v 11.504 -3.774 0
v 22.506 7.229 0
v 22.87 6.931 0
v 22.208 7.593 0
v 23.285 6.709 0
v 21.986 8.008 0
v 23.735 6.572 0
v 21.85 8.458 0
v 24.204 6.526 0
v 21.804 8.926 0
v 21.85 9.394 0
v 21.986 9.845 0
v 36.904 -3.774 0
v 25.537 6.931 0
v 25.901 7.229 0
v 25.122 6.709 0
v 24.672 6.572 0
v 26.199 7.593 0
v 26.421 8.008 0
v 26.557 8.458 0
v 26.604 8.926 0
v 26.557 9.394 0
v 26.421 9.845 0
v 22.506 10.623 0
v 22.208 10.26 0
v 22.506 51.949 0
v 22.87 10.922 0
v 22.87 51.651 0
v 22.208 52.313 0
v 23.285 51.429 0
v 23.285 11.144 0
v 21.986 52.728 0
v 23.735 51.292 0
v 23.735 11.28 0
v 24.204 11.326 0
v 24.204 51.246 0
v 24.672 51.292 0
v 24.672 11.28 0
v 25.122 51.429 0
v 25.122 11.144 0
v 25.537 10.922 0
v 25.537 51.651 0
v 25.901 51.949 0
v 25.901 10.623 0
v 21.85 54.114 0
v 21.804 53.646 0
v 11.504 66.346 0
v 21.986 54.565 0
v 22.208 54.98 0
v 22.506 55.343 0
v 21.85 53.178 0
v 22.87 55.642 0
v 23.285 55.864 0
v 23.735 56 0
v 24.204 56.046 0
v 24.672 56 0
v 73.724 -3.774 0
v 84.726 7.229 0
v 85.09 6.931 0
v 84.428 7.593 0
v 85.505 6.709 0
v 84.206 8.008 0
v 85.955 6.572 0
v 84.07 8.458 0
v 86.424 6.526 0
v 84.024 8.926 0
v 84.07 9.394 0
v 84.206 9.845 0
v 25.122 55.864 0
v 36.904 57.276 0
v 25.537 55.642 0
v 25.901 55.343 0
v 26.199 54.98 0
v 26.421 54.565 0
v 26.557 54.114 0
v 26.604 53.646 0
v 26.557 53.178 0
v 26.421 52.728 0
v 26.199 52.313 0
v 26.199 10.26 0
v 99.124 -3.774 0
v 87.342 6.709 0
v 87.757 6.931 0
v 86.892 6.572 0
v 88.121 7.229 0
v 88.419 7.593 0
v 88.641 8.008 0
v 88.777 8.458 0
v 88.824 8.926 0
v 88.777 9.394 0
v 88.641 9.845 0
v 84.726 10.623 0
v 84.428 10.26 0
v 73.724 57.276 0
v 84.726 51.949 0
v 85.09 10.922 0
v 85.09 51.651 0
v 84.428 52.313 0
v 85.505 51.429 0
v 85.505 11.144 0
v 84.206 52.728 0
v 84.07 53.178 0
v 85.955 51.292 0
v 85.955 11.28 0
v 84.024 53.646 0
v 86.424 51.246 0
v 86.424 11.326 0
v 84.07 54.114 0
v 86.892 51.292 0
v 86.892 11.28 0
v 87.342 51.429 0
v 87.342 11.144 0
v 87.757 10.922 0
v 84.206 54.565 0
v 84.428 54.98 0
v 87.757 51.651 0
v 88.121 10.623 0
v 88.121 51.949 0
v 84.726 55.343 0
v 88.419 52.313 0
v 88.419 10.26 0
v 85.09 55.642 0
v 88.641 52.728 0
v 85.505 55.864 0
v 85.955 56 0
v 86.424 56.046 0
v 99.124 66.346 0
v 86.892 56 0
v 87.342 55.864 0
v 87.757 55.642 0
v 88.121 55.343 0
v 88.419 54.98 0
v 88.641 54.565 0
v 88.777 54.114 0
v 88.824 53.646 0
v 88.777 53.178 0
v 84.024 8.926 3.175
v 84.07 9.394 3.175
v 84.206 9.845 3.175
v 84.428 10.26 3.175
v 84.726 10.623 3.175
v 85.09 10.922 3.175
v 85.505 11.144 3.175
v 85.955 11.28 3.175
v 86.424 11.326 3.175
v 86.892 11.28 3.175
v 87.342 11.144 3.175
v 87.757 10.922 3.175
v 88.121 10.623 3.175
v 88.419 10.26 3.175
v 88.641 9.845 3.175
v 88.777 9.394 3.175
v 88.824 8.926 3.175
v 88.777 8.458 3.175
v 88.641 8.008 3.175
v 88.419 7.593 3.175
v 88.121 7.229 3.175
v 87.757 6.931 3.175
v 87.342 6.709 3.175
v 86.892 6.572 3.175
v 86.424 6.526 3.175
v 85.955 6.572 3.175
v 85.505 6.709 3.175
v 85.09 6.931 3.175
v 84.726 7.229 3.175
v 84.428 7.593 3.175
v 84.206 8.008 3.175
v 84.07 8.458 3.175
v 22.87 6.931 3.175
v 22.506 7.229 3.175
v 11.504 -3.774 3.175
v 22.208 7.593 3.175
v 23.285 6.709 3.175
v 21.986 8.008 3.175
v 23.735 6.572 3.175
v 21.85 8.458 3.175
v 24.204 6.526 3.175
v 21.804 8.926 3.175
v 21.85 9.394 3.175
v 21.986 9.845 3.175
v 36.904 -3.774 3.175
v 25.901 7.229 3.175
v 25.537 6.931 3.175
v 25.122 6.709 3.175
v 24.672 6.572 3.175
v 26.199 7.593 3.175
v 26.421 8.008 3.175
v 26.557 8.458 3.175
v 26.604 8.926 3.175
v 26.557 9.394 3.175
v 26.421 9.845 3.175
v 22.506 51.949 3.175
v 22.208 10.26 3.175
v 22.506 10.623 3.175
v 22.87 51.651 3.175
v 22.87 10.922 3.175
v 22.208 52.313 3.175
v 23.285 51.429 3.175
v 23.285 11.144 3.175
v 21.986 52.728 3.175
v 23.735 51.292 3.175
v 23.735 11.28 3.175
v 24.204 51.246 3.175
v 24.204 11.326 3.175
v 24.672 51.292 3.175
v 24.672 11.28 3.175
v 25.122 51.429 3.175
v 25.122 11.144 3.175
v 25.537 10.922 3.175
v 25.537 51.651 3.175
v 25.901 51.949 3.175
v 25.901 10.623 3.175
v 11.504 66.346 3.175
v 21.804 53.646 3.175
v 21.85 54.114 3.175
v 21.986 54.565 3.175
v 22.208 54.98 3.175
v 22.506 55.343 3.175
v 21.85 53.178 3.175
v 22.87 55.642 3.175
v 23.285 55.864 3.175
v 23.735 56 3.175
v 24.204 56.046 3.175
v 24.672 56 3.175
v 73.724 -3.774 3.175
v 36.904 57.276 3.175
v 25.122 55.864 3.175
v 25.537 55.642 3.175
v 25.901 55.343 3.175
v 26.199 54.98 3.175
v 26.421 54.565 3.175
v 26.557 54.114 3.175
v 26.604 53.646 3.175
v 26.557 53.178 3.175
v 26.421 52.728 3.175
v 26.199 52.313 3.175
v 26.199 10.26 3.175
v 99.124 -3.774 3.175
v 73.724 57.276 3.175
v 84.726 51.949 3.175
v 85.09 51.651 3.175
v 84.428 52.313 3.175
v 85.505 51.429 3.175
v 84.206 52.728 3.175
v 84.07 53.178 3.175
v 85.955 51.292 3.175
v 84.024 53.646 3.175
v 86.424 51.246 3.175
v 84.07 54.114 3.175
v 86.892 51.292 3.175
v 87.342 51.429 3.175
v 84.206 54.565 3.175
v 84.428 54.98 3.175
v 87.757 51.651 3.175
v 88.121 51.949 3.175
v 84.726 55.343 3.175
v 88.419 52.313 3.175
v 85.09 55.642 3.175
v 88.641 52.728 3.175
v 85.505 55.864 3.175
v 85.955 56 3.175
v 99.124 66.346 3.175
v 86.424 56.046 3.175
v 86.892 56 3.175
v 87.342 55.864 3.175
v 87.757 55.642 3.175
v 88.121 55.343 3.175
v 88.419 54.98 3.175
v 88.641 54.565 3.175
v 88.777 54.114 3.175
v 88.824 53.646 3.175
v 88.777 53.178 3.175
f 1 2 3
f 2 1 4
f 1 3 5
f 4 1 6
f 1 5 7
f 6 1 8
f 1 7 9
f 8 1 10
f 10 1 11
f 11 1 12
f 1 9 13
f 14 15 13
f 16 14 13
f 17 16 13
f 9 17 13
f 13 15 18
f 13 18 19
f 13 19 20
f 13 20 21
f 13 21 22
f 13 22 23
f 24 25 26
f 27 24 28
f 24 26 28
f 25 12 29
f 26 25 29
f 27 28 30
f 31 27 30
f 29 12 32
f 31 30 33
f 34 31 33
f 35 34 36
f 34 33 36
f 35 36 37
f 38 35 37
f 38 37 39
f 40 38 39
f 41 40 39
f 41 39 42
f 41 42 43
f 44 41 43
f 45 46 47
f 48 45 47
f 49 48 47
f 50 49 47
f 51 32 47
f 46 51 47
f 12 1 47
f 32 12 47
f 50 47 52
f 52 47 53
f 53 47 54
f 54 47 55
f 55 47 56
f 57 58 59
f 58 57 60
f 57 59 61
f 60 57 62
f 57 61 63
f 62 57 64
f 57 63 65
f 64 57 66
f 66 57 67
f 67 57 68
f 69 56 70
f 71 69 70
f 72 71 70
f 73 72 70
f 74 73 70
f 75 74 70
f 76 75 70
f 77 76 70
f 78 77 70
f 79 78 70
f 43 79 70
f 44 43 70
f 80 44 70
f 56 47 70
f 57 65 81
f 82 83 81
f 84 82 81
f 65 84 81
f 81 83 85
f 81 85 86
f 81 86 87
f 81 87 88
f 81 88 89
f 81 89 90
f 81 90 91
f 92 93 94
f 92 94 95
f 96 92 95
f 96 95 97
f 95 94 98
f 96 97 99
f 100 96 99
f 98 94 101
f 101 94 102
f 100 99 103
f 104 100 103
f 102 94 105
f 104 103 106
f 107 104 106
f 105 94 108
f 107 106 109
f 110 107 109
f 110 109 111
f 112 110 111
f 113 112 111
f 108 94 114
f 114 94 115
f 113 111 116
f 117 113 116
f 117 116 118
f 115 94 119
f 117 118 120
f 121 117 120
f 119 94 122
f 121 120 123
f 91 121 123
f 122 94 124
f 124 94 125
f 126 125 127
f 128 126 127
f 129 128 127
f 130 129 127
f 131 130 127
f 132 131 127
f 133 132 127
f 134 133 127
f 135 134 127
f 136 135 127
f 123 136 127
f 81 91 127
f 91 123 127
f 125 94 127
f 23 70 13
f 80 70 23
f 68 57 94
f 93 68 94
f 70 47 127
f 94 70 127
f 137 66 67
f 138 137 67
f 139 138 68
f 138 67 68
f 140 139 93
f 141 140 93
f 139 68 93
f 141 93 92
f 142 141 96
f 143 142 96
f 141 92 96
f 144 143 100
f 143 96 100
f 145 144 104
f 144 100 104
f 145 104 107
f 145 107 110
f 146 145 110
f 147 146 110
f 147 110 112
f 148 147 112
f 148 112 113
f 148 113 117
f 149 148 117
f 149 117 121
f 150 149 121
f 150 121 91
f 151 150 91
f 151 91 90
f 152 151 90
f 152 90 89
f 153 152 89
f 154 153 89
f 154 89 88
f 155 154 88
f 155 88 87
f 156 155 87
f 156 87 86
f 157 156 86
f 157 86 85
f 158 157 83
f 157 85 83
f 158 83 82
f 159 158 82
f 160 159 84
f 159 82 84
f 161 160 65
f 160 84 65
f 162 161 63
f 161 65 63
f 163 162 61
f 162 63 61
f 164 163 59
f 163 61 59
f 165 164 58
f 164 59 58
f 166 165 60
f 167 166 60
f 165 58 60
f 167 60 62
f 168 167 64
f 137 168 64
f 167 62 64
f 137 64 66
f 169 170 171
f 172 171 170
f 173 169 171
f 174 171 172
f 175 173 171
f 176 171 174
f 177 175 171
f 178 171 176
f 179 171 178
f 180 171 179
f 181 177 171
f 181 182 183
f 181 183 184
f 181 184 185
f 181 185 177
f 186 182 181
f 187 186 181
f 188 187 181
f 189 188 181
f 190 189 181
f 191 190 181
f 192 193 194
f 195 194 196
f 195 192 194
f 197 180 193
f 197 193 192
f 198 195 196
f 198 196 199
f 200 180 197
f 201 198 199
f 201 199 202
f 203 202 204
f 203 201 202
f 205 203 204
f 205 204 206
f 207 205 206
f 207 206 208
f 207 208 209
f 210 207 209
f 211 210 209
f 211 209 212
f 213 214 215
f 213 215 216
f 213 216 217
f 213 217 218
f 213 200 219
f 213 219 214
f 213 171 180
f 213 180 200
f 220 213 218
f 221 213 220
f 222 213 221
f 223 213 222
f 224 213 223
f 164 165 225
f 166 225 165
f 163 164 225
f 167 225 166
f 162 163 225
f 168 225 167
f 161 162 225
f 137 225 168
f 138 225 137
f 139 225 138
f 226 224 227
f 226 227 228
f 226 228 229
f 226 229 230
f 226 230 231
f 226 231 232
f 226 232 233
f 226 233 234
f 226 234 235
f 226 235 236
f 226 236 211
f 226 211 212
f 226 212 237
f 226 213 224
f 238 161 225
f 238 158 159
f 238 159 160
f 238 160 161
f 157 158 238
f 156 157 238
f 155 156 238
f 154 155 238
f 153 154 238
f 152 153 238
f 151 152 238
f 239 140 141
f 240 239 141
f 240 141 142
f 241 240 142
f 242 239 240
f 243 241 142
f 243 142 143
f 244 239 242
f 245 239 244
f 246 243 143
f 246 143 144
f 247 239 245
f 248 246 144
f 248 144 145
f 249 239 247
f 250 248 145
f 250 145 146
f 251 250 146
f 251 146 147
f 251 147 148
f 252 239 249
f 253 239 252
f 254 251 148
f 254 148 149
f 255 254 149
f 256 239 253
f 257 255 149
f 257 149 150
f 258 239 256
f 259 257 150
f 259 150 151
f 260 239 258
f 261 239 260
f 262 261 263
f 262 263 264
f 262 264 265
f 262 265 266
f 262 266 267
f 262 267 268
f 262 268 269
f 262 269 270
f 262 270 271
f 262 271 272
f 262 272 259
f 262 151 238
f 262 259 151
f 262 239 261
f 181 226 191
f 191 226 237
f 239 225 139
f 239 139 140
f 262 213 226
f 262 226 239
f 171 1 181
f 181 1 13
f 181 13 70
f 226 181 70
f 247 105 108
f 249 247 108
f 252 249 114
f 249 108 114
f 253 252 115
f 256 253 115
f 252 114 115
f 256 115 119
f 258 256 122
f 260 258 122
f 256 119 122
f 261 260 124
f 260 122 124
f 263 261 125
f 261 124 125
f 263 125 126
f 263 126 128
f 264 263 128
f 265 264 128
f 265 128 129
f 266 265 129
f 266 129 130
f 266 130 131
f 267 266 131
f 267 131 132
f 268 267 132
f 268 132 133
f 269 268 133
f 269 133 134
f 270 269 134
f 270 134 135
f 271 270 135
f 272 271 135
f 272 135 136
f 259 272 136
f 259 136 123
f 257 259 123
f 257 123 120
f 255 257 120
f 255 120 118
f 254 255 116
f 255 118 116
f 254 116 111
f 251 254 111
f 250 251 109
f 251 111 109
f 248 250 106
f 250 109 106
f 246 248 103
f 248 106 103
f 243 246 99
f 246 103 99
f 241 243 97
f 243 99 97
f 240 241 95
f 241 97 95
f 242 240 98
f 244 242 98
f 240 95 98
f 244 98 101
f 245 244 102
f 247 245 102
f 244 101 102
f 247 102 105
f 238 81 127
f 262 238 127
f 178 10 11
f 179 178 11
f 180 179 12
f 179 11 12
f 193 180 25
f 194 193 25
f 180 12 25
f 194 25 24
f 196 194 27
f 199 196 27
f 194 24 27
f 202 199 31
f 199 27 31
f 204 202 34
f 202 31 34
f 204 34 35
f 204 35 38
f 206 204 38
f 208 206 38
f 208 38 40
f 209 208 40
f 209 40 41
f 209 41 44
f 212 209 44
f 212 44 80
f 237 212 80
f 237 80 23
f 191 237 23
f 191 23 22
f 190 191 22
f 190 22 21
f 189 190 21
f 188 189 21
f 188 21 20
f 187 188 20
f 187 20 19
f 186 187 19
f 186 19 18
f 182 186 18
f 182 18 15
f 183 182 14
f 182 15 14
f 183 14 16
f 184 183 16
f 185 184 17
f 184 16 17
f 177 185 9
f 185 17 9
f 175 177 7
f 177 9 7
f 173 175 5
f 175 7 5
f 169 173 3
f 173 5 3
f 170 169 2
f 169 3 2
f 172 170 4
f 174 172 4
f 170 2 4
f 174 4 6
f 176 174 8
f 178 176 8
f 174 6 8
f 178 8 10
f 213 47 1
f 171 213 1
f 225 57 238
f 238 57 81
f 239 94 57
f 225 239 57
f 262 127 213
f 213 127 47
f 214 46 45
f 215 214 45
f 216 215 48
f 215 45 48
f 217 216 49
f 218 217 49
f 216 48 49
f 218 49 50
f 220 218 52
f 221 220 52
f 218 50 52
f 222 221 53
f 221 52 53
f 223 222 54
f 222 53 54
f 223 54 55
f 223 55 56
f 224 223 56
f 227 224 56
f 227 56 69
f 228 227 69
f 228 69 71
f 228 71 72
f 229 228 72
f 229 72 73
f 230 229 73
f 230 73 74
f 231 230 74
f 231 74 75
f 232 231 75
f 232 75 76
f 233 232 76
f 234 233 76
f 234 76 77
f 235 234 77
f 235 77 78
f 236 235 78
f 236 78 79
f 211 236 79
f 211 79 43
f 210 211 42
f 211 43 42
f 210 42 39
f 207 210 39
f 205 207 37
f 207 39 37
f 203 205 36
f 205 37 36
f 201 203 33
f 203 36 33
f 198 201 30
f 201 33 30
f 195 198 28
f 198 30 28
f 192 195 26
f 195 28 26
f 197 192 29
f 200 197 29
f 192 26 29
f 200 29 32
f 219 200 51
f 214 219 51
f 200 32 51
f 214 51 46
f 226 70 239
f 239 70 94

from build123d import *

# Parameters (mm, degrees)
SKETCH1_R            = 1.091149581
SKETCH1_R_2          = 1.265238112
SKETCH1_R_3          = 1.717110749
SKETCH1_R_4          = 1.455402606
BOSS_EXTRUDE1_DEPTH  = 3.175
M4_CLEARANCE_HOLE1_D = 4.8


with BuildPart() as part:
    # Sketch1 → Boss-Extrude1 (new body)
    with BuildSketch(Plane.XY):
        Polygon((11.503555024, -3.77372269), (36.903555024, -3.77372269), (36.903555024, 57.275941722), (73.723553593, 57.275941722), (73.723553593, -3.77372269), (99.123553593, -3.77372269), (99.123553593, 66.34627731), (73.723553593, 66.34627731), (36.903555024, 66.34627731), (11.503555024, 66.34627731), align=None)
        with Locations((24.203555024, 53.64627731)):
            Circle(SKETCH1_R, mode=Mode.SUBTRACT)
        with Locations((24.203555024, 8.92627731)):
            Circle(SKETCH1_R_2, mode=Mode.SUBTRACT)
        with Locations((86.423553593, 53.64627731)):
            Circle(SKETCH1_R_3, mode=Mode.SUBTRACT)
        with Locations((86.423553593, 8.92627731)):
            Circle(SKETCH1_R_4, mode=Mode.SUBTRACT)
    extrude(amount=BOSS_EXTRUDE1_DEPTH)

    # M4 Clearance Hole1 (through all)
    with Locations(Plane.XY.offset(3.175)):
        with Locations((24.203555024, 53.64627731), (24.203555024, 8.92627731), (86.423553593, 8.92627731), (86.423553593, 53.64627731)):
            Hole(M4_CLEARANCE_HOLE1_D / 2)


solid = part.part
